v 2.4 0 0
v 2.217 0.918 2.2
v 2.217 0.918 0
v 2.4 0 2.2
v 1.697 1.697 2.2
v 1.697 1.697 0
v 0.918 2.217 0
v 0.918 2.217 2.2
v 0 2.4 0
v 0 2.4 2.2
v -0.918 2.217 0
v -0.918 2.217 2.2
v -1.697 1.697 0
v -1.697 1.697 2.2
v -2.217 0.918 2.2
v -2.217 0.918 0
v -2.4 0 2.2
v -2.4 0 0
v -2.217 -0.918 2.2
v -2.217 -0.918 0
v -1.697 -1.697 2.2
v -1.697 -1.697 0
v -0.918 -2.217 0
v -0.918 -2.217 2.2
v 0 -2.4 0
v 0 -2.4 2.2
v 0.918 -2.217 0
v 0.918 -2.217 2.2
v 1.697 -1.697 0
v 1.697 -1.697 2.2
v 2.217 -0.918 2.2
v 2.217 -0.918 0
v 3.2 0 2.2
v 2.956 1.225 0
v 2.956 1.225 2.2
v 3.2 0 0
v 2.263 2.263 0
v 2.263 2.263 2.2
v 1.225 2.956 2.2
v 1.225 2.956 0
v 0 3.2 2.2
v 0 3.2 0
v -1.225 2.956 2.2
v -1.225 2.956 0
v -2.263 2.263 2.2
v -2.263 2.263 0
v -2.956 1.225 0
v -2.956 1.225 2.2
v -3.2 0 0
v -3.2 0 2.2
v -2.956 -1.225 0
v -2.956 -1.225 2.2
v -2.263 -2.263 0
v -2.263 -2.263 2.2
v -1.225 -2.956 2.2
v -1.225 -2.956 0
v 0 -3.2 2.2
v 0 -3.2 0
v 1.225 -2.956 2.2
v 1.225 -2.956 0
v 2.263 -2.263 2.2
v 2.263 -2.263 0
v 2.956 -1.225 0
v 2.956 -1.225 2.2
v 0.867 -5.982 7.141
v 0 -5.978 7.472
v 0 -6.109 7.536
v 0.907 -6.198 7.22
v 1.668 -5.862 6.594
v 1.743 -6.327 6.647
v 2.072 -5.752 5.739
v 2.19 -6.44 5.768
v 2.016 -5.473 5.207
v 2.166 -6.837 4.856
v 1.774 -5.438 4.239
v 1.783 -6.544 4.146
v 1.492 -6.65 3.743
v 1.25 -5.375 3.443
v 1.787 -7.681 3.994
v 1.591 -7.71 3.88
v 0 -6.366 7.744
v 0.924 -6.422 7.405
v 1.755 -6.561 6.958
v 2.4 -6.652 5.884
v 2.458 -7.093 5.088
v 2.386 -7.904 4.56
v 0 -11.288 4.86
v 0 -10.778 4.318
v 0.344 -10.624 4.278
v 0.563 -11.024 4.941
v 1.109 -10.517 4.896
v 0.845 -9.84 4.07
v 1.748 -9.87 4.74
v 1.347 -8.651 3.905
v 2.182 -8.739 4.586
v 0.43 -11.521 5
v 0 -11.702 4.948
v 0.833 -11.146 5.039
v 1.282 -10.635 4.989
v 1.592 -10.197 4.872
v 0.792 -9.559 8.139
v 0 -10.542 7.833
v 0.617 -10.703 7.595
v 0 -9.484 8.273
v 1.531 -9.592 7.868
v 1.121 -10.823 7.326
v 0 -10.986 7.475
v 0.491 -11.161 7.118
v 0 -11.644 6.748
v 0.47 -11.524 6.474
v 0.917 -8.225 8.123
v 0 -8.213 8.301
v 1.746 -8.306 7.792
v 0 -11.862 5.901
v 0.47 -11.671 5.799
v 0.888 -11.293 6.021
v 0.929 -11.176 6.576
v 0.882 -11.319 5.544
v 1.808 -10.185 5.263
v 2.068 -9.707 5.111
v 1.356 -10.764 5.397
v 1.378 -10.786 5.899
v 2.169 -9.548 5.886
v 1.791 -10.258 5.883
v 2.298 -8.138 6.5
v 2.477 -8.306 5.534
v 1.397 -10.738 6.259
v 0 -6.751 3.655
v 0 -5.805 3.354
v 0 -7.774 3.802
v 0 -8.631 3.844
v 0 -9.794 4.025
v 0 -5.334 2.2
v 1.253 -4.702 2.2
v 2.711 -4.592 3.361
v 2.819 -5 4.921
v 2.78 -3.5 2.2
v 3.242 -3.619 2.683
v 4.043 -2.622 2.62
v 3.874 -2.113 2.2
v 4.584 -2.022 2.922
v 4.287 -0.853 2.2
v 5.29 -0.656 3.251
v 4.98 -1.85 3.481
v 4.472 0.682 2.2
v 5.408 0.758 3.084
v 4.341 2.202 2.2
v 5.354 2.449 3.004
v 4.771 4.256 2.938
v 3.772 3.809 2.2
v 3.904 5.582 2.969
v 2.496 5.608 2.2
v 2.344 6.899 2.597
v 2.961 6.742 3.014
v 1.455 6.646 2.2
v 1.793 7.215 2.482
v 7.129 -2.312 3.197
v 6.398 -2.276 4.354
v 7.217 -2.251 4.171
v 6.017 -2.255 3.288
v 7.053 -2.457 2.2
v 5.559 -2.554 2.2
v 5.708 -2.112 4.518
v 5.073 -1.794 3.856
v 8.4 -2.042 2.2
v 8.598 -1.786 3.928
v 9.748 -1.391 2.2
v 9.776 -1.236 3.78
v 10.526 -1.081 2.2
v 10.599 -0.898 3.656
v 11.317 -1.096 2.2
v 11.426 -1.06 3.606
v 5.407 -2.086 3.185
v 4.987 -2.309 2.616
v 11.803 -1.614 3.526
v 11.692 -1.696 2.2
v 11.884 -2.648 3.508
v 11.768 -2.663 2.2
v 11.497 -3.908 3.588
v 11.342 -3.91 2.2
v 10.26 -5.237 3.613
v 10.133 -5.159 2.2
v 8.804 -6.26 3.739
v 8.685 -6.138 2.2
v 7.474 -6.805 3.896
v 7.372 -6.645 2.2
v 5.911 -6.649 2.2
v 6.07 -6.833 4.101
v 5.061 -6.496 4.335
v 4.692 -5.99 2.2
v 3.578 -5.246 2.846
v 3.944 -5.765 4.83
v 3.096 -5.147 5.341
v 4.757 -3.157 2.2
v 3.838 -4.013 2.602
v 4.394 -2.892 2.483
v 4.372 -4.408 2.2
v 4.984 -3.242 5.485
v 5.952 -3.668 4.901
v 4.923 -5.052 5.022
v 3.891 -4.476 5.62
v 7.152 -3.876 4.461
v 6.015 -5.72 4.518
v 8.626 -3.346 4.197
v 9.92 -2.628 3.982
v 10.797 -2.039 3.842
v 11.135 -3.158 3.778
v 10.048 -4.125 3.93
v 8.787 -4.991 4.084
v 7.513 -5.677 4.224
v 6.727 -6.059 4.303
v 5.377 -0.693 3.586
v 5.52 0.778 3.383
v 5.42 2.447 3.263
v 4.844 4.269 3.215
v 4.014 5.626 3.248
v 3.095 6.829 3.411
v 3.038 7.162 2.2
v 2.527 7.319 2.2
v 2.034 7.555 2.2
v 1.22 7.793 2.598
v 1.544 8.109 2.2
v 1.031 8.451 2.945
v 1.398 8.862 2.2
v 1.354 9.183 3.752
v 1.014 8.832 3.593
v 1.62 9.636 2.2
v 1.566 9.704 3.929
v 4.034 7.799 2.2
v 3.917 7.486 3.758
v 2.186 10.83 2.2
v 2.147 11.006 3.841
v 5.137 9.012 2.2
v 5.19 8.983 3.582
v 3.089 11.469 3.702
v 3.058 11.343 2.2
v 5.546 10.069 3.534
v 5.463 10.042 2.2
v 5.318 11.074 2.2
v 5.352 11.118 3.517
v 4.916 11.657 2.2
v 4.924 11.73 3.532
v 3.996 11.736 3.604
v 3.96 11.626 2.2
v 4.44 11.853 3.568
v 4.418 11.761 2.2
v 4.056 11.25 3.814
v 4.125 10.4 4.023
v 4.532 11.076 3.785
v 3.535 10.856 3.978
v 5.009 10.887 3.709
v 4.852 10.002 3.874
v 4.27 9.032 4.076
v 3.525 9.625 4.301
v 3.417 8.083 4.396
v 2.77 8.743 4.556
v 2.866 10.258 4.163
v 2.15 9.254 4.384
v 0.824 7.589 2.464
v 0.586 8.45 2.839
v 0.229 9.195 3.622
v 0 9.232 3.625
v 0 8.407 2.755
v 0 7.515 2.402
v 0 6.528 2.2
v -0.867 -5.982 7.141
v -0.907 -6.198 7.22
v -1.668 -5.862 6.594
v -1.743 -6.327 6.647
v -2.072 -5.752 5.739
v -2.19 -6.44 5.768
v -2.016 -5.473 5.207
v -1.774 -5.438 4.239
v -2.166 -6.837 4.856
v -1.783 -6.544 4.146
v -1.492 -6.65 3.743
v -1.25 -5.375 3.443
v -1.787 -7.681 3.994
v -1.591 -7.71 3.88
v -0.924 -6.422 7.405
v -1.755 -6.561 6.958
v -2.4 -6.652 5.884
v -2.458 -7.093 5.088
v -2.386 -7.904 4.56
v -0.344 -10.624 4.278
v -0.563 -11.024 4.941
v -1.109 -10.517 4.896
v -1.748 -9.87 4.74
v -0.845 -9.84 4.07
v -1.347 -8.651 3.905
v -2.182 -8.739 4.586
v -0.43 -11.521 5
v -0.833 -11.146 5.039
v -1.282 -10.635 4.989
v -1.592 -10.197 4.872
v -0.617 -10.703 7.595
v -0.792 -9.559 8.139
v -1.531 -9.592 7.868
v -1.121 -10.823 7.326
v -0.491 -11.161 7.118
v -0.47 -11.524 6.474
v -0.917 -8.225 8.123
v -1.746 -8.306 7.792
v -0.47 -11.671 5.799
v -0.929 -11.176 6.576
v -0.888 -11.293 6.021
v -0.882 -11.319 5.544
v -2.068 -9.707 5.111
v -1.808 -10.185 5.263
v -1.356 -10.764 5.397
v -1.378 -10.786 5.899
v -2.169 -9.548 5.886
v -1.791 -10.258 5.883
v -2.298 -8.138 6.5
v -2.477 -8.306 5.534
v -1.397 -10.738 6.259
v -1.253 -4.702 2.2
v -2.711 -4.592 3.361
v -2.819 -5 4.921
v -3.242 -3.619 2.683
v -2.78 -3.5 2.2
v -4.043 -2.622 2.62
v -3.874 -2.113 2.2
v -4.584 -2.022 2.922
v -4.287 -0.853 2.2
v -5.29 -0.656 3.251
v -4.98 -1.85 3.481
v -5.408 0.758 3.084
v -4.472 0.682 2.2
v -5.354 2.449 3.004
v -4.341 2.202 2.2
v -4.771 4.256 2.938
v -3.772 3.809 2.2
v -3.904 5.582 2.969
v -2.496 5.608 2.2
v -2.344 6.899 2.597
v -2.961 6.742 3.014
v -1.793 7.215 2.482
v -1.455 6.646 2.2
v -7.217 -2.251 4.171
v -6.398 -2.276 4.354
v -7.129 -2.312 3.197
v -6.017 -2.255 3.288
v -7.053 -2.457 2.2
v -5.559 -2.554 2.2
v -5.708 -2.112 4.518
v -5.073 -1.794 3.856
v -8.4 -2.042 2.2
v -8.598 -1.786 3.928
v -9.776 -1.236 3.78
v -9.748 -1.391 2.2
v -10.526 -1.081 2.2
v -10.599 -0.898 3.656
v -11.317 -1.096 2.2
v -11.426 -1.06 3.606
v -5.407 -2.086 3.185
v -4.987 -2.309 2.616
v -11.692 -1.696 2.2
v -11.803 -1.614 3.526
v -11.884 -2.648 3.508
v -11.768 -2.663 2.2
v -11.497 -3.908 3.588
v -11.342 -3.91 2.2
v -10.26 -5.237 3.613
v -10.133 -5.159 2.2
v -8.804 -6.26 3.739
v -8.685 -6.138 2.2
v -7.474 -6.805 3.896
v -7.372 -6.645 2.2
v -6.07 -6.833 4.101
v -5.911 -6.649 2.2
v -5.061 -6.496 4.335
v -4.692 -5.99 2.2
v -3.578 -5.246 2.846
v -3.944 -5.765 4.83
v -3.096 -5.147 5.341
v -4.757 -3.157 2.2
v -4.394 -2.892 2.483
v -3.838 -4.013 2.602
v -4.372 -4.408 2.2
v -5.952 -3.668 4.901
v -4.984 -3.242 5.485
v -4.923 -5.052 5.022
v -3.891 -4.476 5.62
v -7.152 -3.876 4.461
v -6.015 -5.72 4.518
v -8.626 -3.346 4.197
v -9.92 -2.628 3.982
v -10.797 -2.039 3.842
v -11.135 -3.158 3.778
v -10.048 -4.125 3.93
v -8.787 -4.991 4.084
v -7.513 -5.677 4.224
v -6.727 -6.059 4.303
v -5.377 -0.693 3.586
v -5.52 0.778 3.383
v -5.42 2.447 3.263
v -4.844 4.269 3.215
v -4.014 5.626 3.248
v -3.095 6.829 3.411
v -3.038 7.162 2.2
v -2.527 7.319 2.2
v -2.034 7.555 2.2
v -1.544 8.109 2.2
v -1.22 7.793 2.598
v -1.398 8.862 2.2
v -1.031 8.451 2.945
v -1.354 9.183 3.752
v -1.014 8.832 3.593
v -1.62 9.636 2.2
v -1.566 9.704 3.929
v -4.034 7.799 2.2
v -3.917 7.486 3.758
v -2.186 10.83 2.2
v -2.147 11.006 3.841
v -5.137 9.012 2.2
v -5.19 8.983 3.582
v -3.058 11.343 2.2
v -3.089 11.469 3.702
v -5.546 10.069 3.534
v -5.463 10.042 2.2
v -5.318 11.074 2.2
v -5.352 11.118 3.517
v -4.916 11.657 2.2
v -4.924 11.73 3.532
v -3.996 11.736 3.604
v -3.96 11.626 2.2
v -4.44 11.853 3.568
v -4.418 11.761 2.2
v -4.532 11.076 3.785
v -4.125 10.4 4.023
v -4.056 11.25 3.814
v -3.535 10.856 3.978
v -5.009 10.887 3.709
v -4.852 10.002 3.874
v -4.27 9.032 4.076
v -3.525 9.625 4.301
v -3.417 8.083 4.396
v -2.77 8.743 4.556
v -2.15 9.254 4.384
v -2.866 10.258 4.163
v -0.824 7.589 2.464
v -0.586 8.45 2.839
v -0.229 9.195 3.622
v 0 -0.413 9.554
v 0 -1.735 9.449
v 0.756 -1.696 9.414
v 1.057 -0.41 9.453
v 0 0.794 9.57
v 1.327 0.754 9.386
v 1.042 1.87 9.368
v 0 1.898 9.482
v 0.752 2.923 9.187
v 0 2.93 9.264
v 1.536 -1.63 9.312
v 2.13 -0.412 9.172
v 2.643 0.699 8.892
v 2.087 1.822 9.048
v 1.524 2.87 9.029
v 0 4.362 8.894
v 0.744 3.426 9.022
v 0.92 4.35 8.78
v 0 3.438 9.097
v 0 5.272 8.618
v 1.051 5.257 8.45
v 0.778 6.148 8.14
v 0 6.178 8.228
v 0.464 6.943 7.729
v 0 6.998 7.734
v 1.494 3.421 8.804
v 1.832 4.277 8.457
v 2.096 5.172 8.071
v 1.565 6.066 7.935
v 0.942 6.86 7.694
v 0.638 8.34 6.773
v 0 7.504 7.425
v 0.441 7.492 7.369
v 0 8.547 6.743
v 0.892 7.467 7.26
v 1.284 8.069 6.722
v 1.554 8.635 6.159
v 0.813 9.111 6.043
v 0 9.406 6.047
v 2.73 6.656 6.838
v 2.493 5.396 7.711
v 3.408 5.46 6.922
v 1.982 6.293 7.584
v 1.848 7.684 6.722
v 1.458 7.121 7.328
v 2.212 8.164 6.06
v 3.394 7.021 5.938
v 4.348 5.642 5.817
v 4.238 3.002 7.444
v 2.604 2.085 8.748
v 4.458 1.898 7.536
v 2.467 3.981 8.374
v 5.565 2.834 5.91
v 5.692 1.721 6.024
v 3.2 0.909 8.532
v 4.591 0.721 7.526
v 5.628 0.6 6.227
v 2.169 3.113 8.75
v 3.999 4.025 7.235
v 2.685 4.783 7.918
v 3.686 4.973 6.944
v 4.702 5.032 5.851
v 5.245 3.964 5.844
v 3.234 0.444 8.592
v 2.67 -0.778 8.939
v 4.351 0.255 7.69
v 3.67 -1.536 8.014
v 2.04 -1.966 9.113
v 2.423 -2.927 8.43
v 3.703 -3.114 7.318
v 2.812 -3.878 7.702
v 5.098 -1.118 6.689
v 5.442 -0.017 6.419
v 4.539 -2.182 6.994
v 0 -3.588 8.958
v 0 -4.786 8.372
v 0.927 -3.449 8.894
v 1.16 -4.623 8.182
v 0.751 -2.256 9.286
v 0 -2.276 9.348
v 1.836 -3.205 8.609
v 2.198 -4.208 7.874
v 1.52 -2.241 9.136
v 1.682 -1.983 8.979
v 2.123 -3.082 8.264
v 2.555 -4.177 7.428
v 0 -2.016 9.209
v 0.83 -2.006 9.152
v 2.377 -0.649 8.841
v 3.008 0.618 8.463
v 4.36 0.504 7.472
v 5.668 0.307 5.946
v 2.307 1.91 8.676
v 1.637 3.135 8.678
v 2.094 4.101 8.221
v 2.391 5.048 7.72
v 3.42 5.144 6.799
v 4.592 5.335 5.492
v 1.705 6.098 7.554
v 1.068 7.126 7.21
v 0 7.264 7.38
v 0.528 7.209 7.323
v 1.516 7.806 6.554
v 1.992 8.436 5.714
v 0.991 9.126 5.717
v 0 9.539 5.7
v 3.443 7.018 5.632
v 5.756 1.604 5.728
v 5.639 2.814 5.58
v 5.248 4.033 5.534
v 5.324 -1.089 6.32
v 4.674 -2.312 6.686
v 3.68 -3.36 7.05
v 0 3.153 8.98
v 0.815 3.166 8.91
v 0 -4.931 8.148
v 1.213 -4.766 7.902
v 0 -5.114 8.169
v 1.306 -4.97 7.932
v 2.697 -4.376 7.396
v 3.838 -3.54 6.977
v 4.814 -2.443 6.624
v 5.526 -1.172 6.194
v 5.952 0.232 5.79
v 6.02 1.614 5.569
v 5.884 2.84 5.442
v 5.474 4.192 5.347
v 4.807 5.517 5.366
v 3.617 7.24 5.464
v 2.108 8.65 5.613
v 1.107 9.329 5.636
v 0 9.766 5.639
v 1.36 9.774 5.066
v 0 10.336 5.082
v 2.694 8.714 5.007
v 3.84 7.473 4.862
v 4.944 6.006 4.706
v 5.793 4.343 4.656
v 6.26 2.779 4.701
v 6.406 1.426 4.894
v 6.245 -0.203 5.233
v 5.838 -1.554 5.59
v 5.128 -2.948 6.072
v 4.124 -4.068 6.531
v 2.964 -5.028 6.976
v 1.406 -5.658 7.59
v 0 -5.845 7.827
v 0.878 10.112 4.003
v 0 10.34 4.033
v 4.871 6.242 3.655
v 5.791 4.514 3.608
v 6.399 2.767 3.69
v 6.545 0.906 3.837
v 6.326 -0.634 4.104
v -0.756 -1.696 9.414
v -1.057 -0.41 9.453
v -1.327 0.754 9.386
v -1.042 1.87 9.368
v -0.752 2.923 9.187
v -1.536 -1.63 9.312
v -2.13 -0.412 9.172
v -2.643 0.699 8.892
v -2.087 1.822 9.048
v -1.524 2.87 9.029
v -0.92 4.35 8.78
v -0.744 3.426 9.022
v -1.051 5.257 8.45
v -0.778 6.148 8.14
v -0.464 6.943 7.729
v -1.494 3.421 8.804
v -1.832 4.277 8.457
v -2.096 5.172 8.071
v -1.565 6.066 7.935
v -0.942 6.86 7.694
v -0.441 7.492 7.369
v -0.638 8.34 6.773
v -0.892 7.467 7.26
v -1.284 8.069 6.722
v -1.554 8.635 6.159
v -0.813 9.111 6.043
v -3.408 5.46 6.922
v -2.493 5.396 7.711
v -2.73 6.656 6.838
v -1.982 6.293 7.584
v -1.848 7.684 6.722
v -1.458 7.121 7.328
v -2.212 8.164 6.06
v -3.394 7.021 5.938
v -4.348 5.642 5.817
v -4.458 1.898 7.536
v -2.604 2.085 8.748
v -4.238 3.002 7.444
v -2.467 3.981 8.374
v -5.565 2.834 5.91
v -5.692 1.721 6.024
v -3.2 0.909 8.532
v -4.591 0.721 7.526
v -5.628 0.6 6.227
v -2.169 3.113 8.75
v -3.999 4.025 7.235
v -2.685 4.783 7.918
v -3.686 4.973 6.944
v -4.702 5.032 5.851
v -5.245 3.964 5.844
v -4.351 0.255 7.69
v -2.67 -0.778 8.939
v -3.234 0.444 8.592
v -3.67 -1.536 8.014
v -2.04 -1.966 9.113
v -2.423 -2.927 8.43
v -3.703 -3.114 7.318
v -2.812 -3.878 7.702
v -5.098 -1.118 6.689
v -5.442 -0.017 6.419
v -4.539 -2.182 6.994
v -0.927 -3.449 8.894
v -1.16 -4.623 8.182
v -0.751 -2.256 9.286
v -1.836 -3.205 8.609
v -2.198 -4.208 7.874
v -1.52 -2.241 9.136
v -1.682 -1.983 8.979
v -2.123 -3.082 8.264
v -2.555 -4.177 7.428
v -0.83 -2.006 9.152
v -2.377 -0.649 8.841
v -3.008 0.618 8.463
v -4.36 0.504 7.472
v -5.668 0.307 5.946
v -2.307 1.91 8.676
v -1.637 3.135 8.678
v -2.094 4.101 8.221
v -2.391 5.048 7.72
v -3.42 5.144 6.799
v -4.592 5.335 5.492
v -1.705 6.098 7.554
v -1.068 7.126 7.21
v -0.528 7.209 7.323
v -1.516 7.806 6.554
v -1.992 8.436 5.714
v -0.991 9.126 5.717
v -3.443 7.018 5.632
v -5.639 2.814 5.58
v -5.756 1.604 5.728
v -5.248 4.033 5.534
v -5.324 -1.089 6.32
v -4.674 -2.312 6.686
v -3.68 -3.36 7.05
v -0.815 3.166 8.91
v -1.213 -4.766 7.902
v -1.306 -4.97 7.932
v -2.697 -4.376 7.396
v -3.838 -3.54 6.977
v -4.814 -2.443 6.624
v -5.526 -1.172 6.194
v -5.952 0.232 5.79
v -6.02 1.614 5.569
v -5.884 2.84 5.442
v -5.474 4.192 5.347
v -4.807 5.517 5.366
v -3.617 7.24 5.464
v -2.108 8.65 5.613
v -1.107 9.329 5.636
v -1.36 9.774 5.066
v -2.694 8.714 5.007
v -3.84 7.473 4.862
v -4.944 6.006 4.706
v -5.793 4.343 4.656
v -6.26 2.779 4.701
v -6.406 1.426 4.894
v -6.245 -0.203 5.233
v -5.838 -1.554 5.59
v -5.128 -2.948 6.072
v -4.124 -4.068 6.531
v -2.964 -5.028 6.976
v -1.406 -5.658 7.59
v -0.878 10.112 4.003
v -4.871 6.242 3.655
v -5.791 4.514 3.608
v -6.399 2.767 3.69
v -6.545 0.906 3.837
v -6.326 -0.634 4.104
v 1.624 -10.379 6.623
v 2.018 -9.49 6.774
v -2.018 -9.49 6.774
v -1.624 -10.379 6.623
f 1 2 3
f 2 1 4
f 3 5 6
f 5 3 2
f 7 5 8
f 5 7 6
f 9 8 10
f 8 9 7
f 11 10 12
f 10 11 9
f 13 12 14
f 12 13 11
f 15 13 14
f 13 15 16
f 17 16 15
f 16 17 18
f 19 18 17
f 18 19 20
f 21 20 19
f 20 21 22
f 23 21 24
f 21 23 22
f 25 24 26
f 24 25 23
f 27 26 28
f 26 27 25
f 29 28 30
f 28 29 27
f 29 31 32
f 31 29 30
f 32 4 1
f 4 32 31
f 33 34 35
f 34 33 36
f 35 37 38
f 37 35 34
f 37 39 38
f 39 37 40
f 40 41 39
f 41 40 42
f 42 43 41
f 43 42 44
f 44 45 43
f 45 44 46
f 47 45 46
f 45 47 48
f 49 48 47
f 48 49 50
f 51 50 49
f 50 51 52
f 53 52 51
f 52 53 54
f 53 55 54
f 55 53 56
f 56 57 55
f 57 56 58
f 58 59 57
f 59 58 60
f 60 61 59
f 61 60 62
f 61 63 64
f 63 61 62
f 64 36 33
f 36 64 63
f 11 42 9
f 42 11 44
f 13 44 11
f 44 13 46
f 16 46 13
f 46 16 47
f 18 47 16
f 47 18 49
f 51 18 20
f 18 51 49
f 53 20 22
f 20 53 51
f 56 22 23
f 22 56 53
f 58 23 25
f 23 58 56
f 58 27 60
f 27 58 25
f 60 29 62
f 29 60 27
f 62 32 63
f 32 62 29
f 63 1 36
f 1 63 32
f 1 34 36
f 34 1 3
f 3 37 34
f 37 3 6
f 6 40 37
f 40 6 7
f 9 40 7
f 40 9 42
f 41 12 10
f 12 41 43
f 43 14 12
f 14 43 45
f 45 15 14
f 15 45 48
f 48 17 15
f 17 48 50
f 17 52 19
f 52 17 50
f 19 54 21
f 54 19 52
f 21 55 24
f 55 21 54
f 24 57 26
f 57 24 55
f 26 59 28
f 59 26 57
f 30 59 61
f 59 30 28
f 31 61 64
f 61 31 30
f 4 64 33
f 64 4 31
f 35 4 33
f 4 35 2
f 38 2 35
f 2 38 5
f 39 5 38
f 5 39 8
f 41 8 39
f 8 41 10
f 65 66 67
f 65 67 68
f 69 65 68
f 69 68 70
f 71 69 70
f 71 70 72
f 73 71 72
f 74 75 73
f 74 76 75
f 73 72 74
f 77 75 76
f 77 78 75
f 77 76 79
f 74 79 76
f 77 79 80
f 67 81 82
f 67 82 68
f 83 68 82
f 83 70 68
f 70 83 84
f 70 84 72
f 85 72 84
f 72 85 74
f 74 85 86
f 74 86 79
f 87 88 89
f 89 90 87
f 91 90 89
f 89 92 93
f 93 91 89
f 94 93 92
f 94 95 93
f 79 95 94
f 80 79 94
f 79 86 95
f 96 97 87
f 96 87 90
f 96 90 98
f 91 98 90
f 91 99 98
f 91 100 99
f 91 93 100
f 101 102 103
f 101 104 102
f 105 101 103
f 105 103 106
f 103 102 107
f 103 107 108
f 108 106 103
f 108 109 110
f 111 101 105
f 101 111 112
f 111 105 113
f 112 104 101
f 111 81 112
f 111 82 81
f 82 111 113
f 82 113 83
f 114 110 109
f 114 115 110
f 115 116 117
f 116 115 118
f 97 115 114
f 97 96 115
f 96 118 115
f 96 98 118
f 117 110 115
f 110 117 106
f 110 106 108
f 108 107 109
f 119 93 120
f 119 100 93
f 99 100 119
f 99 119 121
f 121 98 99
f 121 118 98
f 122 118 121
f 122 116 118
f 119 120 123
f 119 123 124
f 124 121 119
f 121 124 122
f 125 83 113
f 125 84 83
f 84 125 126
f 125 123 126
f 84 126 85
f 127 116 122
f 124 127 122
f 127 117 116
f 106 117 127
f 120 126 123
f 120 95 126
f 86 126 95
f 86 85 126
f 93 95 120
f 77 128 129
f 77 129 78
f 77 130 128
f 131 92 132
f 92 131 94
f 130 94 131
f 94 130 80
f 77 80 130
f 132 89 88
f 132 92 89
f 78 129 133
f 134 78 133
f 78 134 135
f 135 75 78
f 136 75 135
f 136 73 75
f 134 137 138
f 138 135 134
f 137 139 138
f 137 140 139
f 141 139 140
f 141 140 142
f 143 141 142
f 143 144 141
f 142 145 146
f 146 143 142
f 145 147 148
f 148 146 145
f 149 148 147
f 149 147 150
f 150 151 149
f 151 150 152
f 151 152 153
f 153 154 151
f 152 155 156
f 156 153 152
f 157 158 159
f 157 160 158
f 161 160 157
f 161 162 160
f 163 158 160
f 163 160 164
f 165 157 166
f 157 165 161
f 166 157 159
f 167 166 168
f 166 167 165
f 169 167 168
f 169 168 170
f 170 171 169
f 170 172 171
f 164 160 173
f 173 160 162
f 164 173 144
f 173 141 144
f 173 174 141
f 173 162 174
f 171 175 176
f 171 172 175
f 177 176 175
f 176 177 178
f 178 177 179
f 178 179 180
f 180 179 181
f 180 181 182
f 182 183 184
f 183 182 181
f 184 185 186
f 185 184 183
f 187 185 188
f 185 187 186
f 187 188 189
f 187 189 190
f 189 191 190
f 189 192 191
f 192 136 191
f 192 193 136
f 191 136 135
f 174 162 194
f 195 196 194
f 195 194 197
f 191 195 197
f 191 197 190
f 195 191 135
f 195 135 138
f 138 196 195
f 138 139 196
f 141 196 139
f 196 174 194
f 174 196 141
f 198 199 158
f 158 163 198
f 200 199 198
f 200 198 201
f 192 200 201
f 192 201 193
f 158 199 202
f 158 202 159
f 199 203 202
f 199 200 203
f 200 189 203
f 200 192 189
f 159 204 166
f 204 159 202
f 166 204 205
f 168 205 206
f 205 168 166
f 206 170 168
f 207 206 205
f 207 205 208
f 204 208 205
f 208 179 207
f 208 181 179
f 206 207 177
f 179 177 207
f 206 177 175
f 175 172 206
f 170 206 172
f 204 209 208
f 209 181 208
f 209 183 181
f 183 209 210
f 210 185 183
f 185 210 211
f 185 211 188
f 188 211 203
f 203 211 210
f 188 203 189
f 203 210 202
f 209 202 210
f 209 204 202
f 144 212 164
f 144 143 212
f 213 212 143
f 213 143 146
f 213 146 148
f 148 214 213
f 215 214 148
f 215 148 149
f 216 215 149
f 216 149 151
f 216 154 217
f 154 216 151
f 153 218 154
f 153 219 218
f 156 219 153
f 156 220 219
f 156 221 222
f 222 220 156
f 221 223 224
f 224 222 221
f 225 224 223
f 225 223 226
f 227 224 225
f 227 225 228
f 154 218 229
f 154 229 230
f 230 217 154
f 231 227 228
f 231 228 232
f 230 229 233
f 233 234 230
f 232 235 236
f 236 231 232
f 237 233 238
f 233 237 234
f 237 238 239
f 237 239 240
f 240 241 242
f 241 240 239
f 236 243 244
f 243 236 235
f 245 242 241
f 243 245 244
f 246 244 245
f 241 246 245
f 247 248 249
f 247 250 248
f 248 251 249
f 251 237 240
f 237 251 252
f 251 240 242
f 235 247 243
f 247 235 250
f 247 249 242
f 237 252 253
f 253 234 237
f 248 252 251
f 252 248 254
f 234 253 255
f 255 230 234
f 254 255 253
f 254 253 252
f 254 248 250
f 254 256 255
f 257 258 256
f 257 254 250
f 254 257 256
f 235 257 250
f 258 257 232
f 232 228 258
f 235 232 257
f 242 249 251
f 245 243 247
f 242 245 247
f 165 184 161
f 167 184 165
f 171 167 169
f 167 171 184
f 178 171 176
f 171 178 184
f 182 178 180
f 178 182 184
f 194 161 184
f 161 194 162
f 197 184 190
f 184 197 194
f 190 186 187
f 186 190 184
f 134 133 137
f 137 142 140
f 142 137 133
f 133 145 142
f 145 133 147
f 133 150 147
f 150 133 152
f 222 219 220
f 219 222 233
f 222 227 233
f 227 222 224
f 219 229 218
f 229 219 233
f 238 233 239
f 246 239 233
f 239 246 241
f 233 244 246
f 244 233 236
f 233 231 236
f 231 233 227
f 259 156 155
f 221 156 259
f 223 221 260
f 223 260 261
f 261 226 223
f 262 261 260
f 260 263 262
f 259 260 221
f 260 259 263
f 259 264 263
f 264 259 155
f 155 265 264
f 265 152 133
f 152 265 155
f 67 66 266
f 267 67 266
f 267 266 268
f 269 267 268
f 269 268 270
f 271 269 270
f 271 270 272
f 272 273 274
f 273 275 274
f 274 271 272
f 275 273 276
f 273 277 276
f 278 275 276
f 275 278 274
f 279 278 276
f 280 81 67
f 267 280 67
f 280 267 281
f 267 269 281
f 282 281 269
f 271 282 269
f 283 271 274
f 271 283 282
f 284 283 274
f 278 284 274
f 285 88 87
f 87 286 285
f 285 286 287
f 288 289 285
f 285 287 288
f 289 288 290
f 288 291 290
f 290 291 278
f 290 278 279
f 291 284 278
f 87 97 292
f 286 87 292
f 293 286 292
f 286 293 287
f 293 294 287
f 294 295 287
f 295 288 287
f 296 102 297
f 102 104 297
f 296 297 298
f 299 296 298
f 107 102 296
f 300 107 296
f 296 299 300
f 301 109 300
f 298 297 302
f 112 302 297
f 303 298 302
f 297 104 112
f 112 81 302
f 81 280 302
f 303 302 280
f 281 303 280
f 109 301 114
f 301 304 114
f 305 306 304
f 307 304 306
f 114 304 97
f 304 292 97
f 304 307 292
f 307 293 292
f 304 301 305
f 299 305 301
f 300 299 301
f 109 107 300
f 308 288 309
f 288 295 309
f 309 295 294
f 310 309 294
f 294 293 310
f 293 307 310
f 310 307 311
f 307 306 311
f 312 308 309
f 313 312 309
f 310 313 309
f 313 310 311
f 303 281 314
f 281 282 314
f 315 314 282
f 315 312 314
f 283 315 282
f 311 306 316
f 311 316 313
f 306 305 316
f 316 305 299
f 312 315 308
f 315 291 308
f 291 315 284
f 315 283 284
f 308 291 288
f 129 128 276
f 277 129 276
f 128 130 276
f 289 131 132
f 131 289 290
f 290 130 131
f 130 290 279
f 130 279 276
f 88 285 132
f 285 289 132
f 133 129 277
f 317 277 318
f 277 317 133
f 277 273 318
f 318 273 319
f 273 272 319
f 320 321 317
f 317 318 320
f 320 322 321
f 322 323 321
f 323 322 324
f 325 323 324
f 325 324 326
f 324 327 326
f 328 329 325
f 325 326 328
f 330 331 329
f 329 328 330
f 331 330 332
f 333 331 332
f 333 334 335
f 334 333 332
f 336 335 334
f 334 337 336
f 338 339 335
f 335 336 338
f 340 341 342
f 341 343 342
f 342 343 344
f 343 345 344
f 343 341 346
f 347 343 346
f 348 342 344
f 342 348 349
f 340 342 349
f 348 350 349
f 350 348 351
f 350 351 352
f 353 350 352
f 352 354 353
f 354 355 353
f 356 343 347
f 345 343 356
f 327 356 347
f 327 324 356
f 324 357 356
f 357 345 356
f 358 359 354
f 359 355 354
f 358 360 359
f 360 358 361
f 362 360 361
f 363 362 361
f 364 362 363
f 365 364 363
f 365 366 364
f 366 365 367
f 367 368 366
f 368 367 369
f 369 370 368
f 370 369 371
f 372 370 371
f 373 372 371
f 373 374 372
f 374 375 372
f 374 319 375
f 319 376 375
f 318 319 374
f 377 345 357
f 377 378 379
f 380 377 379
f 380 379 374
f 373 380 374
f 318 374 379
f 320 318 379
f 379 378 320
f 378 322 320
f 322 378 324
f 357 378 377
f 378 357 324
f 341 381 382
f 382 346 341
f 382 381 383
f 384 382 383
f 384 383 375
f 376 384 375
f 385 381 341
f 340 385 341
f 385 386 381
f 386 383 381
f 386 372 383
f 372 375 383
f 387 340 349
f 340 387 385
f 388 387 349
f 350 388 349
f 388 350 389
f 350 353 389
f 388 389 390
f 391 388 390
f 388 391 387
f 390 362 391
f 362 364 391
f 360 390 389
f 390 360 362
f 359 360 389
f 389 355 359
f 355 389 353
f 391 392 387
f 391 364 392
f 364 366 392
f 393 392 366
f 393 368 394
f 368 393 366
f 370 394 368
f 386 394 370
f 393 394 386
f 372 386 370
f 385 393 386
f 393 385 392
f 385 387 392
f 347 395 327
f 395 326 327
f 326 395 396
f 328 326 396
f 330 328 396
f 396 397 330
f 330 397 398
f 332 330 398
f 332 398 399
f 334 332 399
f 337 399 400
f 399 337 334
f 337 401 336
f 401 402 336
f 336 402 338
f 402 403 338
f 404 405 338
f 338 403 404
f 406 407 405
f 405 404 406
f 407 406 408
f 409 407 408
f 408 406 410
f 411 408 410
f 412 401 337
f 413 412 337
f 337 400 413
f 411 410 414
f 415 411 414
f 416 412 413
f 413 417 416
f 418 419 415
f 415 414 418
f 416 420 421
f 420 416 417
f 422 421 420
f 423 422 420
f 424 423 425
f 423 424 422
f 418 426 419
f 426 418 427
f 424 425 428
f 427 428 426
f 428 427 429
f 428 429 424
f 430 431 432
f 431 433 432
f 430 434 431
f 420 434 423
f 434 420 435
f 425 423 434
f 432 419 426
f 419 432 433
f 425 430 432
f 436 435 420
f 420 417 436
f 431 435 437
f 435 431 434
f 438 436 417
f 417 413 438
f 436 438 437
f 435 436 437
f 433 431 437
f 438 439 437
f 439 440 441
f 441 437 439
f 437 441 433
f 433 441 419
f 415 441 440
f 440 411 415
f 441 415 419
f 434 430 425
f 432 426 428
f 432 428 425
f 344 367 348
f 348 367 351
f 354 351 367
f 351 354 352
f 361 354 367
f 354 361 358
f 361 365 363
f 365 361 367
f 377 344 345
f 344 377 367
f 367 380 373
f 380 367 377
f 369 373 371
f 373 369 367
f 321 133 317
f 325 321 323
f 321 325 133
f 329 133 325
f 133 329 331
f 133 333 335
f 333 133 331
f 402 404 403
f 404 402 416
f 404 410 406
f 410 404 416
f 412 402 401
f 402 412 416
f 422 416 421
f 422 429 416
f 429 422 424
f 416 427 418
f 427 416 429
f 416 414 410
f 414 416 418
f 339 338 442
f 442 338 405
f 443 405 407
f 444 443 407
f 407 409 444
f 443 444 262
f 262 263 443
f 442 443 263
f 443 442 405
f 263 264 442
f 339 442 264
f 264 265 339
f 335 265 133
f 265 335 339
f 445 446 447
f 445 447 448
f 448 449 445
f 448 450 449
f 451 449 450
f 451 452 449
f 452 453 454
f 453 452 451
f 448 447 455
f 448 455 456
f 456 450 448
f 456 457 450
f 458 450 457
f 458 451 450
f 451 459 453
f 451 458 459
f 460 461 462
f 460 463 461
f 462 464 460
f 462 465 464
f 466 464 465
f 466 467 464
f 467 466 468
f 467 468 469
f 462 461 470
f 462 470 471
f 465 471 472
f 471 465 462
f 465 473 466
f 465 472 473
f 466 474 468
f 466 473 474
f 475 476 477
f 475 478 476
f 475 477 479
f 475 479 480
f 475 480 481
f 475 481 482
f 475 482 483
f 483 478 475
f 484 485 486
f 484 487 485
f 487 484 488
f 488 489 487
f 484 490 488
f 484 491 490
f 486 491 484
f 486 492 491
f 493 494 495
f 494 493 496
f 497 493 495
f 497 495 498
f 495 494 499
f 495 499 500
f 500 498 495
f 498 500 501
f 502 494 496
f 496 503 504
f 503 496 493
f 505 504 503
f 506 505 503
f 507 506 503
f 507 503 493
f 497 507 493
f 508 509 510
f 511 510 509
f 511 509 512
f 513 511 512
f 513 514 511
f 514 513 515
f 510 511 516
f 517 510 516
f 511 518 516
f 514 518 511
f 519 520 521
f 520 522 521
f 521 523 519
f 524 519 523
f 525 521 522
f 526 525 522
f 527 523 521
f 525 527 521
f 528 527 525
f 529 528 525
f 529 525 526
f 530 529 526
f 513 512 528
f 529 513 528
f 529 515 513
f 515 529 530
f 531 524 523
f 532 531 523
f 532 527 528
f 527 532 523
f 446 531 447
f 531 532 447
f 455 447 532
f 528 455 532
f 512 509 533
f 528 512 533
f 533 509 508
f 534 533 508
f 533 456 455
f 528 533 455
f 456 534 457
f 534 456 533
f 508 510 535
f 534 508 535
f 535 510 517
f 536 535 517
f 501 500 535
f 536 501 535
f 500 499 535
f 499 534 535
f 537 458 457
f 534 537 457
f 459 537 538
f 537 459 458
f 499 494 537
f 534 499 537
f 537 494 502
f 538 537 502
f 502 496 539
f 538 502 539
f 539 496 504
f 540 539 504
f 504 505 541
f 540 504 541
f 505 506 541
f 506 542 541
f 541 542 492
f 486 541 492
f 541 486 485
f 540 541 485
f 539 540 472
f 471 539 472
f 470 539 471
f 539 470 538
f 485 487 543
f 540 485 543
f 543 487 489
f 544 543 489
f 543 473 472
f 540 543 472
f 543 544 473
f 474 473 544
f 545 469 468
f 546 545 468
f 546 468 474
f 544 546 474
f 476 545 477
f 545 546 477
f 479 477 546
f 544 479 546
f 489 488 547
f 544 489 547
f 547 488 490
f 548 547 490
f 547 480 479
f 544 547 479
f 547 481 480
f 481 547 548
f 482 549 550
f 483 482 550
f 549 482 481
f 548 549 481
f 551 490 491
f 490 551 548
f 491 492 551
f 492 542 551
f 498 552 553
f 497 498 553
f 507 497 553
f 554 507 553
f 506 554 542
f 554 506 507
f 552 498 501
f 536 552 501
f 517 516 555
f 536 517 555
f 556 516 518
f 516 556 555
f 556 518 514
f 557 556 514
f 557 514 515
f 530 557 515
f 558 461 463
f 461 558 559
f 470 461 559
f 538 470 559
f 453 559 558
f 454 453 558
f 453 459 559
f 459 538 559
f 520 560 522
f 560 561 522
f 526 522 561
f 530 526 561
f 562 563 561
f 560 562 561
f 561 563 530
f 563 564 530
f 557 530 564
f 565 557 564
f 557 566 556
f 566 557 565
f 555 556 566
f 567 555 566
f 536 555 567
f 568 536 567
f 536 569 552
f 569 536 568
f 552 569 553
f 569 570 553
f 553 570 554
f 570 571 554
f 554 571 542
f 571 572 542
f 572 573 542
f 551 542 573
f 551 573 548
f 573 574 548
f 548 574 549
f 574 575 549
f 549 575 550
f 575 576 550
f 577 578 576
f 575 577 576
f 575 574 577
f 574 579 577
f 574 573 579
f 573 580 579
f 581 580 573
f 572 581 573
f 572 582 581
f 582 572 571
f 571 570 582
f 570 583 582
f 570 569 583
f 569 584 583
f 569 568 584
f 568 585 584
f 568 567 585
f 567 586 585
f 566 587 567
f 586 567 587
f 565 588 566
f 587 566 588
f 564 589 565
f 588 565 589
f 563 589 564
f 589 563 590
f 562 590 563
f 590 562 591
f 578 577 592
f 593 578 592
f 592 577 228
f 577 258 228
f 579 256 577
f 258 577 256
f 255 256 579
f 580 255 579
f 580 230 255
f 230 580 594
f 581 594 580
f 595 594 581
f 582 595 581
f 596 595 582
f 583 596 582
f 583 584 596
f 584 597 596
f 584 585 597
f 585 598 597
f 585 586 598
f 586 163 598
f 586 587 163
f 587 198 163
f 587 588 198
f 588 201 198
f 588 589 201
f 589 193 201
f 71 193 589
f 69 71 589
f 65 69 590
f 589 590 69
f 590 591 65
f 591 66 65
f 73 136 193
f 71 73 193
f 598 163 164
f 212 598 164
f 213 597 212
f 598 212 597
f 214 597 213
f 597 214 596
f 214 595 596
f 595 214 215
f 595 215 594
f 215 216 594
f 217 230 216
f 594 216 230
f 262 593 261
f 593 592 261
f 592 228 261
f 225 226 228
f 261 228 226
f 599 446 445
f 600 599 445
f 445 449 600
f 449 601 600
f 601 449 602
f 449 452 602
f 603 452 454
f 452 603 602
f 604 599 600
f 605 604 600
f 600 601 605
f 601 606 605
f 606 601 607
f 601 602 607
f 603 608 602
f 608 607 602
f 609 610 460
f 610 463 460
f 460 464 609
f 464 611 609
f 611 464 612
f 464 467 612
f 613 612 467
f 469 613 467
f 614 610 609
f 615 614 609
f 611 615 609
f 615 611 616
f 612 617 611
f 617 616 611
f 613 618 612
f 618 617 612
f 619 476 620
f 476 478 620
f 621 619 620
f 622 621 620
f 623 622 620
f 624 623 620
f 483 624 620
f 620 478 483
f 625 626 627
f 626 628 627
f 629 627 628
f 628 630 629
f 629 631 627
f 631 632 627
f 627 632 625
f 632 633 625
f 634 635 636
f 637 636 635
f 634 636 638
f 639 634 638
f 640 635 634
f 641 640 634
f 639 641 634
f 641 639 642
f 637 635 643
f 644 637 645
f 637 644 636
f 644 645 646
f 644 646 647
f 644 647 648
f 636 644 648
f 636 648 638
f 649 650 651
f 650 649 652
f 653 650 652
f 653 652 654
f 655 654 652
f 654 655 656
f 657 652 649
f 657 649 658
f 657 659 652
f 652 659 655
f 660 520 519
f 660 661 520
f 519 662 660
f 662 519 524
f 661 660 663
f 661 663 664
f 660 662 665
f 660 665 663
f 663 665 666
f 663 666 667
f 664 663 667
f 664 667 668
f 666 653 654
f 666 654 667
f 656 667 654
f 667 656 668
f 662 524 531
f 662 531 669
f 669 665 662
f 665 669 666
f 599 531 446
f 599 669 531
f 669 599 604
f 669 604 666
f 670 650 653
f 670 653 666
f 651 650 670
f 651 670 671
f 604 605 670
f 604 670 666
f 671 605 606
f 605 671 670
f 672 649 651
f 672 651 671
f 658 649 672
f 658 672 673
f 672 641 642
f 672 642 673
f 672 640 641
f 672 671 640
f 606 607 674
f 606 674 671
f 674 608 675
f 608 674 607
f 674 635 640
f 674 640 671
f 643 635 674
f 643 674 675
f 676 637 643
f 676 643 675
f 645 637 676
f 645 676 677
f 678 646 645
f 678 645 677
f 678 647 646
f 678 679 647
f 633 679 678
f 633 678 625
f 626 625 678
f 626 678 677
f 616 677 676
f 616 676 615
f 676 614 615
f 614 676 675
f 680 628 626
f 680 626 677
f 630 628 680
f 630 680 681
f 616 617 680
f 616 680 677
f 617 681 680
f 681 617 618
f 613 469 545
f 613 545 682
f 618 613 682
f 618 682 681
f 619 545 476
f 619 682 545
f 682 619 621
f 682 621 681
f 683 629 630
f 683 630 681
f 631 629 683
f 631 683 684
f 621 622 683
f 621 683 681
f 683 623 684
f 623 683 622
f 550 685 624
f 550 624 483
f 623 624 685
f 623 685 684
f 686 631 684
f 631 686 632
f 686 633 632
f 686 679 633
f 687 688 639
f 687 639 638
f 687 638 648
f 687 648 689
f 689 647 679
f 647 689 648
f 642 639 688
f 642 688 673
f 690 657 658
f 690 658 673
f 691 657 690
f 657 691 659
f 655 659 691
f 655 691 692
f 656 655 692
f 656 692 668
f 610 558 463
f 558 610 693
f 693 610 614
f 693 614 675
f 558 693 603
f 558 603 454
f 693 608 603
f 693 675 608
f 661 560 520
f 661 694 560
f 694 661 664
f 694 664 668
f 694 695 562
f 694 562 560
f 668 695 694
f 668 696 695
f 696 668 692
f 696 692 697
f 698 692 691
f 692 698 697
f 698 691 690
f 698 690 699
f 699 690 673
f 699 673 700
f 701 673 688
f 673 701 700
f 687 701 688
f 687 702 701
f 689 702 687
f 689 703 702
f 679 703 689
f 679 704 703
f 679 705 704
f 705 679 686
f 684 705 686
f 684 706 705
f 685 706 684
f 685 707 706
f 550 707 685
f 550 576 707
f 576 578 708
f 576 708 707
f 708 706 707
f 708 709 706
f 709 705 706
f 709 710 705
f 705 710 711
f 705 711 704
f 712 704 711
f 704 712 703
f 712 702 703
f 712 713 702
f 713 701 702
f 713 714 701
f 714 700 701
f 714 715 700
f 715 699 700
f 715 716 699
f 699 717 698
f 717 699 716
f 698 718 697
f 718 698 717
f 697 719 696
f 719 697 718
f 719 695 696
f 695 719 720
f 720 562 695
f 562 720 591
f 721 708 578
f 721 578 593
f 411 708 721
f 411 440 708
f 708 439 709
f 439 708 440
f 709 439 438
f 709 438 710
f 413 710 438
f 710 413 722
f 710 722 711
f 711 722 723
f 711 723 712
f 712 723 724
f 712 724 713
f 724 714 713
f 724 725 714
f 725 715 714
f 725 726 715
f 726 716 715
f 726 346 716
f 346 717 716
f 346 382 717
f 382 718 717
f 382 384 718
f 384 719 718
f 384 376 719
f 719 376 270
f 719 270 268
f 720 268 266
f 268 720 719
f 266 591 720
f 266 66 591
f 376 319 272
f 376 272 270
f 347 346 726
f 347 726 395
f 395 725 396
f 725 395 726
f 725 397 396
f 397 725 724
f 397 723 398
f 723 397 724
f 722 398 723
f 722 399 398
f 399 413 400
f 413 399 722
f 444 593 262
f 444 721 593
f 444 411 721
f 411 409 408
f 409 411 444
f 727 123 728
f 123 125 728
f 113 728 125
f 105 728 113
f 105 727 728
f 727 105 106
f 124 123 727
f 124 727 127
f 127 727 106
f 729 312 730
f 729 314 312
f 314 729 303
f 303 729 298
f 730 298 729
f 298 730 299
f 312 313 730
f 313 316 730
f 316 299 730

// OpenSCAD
use <../lib.scad>
use <s/67040s01.scad>
use <s/67040s02.scad>
use <../p/stud4.scad>
function ldraw_lib__67040() = [
// 0 Animal Sea Turtle Baby
// 0 Name: 67040.dat
// 0 Author: Philippe Hurbain [Philo]
// 0 !LDRAW_ORG Part UPDATE 2024-02
// 0 !LICENSE Licensed under CC BY 4.0 : see CAreadme.txt
// 
// 0 BFC CERTIFY CCW
  [0,"BFC","CERTIFY"],
  [0,"BFC","CCW"],
// 
// 0 !HISTORY 2024-01-02 {LEGO Instructions App} Original part shape
// 0 !HISTORY 2024-01-02 [Philo] File preparation for LDraw Parts Tracker
// 0 !HISTORY 2024-03-24 [OrionP] Official Update 2024-02
// 
// 1 16 0 -5.5 0 1 0 0 0 -1.375 0 0 0 1 stud4.dat
  [1,16,0,-5.5,0,1,0,0,0,-1.375,0,0,0,1, ldraw_lib__stud4()],
// 1 16 0 0 0 1 0 0 0 1 0 0 0 1 s\67040s01.dat
  [1,16,0,0,0,1,0,0,0,1,0,0,0,1, ldraw_lib__s__67040s01()],
// 1 16 0 0 0 -1 0 0 0 1 0 0 0 1 s\67040s01.dat
  [1,16,0,0,0,-1,0,0,0,1,0,0,0,1, ldraw_lib__s__67040s01()],
// 
// 1 16 0 0 0 1 0 0 0 1 0 0 0 1 s\67040s02.dat
  [1,16,0,0,0,1,0,0,0,1,0,0,0,1, ldraw_lib__s__67040s02()],
// 1 16 0 0 0 -1 0 0 0 1 0 0 0 1 s\67040s02.dat
  [1,16,0,0,0,-1,0,0,0,1,0,0,0,1, ldraw_lib__s__67040s02()],
// 
// 0 // Eye areas
// 3 16 4.061 -16.557 -25.948 5.422 -14.714 -23.869 5.044 -16.934 -23.725
  [3,16,4.061,-16.557,-25.948,5.422,-14.714,-23.869,5.044,-16.934,-23.725],
// 3 16 5.422 -14.714 -23.869 5.746 -16.25 -20.345 5.044 -16.934 -23.725
  [3,16,5.422,-14.714,-23.869,5.746,-16.25,-20.345,5.044,-16.934,-23.725],
// 3 16 4.364 -19.48 -20.766 5.044 -16.934 -23.725 5.746 -16.25 -20.345
  [3,16,4.364,-19.48,-20.766,5.044,-16.934,-23.725,5.746,-16.25,-20.345],
// 3 16 3.827 -19.669 -23.979 5.044 -16.934 -23.725 4.364 -19.48 -20.766
  [3,16,3.827,-19.669,-23.979,5.044,-16.934,-23.725,4.364,-19.48,-20.766],
// 4 16 4.061 -16.557 -25.948 5.044 -16.934 -23.725 3.827 -19.669 -23.979 2.802 -18.314 -27.057
  [4,16,4.061,-16.557,-25.948,5.044,-16.934,-23.725,3.827,-19.669,-23.979,2.802,-18.314,-27.057],
// 3 16 4.478 -14.708 -25.646 5.422 -14.714 -23.869 4.061 -16.557 -25.948
  [3,16,4.478,-14.708,-25.646,5.422,-14.714,-23.869,4.061,-16.557,-25.948],
// 3 16 4.478 -14.708 -25.646 4.061 -16.557 -25.948 3.493 -15.648 -26.846
  [3,16,4.478,-14.708,-25.646,4.061,-16.557,-25.948,3.493,-15.648,-26.846],
// 3 16 3.493 -15.648 -26.846 4.061 -16.557 -25.948 2.802 -18.314 -27.057
  [3,16,3.493,-15.648,-26.846,4.061,-16.557,-25.948,2.802,-18.314,-27.057],
// 
// 3 16 -5.044 -16.934 -23.725 -5.422 -14.714 -23.869 -4.061 -16.557 -25.948
  [3,16,-5.044,-16.934,-23.725,-5.422,-14.714,-23.869,-4.061,-16.557,-25.948],
// 3 16 -5.044 -16.934 -23.725 -5.746 -16.25 -20.345 -5.422 -14.714 -23.869
  [3,16,-5.044,-16.934,-23.725,-5.746,-16.25,-20.345,-5.422,-14.714,-23.869],
// 3 16 -5.746 -16.25 -20.345 -5.044 -16.934 -23.725 -4.364 -19.48 -20.766
  [3,16,-5.746,-16.25,-20.345,-5.044,-16.934,-23.725,-4.364,-19.48,-20.766],
// 3 16 -4.364 -19.48 -20.766 -5.044 -16.934 -23.725 -3.827 -19.669 -23.979
  [3,16,-4.364,-19.48,-20.766,-5.044,-16.934,-23.725,-3.827,-19.669,-23.979],
// 4 16 -3.827 -19.669 -23.979 -5.044 -16.934 -23.725 -4.061 -16.557 -25.948 -2.802 -18.314 -27.057
  [4,16,-3.827,-19.669,-23.979,-5.044,-16.934,-23.725,-4.061,-16.557,-25.948,-2.802,-18.314,-27.057],
// 3 16 -5.422 -14.714 -23.869 -4.478 -14.708 -25.646 -4.061 -16.557 -25.948
  [3,16,-5.422,-14.714,-23.869,-4.478,-14.708,-25.646,-4.061,-16.557,-25.948],
// 3 16 -4.478 -14.708 -25.646 -3.493 -15.648 -26.846 -4.061 -16.557 -25.948
  [3,16,-4.478,-14.708,-25.646,-3.493,-15.648,-26.846,-4.061,-16.557,-25.948],
// 3 16 -3.493 -15.648 -26.846 -2.802 -18.314 -27.057 -4.061 -16.557 -25.948
  [3,16,-3.493,-15.648,-26.846,-2.802,-18.314,-27.057,-4.061,-16.557,-25.948],
];
module ldraw_lib__67040(step=0, col=false, unit=2/5, alt=false, line=0.2, solid=!$preview)
    makepoly(ldraw_lib__67040(), step=step, col=col, unit=unit, alt=alt, line=line, solid=solid);
ldraw_lib__67040(line=0.2);
